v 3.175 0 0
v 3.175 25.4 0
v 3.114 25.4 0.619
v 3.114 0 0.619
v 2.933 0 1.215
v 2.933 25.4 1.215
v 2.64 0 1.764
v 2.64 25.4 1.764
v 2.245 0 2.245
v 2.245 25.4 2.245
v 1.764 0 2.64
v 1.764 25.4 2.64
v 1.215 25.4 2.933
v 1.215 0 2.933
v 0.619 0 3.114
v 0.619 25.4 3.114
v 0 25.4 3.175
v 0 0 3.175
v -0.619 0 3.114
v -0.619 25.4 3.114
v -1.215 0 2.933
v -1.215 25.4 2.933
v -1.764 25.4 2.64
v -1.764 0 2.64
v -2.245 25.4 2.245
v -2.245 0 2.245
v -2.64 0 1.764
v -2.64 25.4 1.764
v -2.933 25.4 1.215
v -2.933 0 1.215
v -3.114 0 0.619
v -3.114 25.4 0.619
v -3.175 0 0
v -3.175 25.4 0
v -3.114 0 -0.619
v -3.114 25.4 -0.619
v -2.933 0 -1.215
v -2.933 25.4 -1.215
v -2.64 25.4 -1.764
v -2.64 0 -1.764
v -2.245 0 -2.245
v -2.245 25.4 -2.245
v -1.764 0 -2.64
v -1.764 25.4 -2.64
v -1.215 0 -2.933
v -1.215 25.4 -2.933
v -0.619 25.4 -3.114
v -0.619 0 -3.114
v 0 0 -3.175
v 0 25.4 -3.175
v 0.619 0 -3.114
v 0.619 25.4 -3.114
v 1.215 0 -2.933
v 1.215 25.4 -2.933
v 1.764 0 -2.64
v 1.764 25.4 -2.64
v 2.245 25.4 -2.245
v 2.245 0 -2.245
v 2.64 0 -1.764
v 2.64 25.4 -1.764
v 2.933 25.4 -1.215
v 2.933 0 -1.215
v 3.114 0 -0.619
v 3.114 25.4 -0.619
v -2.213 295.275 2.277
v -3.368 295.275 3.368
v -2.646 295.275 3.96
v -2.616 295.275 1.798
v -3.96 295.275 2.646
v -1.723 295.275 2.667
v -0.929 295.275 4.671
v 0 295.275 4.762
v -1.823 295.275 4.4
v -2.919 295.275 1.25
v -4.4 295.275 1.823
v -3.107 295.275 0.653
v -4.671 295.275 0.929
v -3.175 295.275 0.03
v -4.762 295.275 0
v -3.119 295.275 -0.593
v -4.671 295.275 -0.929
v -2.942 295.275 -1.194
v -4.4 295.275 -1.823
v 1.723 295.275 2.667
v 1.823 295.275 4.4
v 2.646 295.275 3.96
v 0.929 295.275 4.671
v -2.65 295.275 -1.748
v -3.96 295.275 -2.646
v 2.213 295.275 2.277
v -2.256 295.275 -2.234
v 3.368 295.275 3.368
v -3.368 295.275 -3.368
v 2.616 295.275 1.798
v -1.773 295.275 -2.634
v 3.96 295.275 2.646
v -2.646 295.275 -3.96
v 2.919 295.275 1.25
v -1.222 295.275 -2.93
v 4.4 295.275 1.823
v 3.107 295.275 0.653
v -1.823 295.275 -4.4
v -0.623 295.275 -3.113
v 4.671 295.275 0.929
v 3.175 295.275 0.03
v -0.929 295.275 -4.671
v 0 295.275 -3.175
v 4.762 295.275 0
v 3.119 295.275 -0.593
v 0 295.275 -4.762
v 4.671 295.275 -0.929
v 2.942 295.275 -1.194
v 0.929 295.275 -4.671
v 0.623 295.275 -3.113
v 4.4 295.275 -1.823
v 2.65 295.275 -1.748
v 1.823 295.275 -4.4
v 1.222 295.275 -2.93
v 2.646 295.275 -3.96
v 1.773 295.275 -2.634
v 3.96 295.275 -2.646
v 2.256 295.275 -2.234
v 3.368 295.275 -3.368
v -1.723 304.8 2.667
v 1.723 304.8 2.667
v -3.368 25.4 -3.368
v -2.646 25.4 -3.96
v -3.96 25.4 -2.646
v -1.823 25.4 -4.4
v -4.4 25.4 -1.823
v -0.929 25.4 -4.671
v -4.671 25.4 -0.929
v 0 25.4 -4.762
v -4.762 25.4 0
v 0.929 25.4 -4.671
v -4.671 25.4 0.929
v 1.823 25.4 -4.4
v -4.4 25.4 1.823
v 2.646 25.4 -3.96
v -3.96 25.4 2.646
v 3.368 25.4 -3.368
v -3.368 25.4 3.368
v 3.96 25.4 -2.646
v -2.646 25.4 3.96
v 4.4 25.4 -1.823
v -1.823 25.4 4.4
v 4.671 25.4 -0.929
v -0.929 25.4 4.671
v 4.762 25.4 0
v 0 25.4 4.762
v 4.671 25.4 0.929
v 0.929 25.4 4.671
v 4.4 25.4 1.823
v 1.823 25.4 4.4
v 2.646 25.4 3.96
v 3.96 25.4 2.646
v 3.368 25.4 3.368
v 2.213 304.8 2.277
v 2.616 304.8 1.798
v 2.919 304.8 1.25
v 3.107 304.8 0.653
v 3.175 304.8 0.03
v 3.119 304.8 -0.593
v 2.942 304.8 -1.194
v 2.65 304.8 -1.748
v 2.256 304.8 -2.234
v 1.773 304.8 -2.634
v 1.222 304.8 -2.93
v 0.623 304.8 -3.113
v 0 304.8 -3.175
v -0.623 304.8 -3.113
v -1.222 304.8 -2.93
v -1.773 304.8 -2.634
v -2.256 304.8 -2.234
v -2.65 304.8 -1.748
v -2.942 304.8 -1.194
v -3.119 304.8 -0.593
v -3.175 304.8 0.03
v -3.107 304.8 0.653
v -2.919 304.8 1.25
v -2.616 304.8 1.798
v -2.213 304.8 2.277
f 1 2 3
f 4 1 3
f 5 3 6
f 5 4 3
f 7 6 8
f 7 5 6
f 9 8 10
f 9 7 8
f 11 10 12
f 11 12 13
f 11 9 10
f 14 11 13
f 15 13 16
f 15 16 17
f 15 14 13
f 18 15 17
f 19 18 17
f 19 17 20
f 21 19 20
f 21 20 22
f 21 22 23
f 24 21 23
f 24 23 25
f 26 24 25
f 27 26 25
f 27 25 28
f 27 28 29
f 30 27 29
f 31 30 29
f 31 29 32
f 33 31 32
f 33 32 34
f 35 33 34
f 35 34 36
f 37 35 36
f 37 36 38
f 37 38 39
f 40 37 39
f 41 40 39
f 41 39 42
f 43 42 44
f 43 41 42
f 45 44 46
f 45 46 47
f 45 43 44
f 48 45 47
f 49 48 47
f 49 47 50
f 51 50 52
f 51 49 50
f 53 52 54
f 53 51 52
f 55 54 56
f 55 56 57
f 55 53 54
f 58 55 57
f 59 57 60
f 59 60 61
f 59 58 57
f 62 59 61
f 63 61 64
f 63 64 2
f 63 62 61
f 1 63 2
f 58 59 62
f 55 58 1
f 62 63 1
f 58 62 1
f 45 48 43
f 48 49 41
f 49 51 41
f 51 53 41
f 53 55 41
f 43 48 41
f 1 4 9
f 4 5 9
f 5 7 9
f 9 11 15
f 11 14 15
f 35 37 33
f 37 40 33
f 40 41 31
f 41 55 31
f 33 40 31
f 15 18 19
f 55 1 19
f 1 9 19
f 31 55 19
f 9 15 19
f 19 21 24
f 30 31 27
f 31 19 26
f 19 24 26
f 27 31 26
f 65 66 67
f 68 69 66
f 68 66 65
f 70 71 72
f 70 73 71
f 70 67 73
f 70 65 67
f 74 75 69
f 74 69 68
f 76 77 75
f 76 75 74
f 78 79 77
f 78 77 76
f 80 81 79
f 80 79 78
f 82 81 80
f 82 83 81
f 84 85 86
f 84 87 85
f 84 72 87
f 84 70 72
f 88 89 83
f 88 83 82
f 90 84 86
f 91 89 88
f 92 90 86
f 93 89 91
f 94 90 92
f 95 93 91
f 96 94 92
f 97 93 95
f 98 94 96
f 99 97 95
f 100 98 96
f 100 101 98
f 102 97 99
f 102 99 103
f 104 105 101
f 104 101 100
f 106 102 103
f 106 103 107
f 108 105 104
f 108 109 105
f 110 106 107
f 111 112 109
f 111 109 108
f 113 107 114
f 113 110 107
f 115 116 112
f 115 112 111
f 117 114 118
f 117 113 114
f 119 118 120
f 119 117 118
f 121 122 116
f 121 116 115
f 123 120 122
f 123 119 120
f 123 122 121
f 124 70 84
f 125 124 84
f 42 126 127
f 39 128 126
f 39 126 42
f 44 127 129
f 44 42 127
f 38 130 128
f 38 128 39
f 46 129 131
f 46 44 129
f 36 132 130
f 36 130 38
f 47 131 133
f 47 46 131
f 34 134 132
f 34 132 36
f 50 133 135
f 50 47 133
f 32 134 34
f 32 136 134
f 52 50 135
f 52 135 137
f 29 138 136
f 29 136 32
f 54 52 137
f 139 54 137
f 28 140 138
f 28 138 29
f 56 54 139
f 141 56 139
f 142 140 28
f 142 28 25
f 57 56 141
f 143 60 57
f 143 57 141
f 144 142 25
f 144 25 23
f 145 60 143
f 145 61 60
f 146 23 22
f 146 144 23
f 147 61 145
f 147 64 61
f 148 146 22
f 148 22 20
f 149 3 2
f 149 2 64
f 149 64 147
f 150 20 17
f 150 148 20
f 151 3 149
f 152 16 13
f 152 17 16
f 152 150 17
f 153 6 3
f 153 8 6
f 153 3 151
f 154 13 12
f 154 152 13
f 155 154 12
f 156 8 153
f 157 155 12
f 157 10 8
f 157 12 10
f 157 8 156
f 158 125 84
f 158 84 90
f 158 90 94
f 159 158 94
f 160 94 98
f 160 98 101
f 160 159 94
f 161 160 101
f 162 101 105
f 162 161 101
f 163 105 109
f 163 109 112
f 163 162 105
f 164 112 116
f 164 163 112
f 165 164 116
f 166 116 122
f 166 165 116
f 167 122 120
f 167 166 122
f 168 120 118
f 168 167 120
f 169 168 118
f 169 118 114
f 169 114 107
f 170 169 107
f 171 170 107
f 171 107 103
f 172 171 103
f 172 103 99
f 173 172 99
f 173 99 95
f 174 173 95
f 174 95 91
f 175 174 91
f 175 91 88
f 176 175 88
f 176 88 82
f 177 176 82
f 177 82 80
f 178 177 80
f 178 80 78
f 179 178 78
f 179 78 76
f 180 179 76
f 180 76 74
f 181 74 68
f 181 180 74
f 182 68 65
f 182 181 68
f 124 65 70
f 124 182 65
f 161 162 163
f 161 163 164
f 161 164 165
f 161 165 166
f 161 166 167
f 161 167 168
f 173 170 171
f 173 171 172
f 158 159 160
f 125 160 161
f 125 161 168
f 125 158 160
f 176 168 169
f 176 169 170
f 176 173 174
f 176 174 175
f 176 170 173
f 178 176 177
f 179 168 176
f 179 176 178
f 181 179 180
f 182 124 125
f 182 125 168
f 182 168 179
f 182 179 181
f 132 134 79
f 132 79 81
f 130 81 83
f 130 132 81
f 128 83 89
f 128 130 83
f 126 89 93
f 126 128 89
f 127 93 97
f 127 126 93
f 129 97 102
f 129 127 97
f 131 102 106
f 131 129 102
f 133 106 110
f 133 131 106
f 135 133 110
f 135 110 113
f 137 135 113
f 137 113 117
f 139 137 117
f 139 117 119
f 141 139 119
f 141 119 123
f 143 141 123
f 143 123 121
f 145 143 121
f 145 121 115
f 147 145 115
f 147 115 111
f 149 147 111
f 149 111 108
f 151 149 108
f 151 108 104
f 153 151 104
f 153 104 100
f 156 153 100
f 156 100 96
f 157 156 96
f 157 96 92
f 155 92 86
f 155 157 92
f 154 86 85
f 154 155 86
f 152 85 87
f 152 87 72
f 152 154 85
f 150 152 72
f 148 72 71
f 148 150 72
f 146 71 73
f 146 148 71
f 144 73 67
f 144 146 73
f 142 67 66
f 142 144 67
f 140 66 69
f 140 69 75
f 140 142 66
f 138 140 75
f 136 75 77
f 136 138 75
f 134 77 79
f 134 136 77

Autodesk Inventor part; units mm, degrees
ref_plane "YZ Plane" through (0, 0, 0) normal (1, 0, 0) x (0, 1, 0)
ref_plane "XZ Plane" through (0, 0, 0) normal (0, 1, 0) x (-1, 0, 0)
ref_plane "XY Plane" through (0, 0, 0) normal (0, 0, 1) x (1, 0, 0)
sketch "Sketch1" plane through (0, 0, 0) normal (0, 1, 0) x (-1, 0, 0)
  circle A0 centre (0, 0) radius 4.7625
  dimension "d0" = 9.525
extrude "Extrusion1" add sketch "Sketch1" along normal blind 304.8
thread "Thread1" size "3/8-12" class "2B" standard "Inch Tapping Threads" full length
sketch "Sketch2" plane through (0, 304.8, 0) normal (0, 1, 0) x (1, 0, 0)
  circle A0 centre (0, 0) radius 4.7625 projected
  arc A1 (1.7227, -2.667) -> (-1.7227, -2.667) centre (0, 0) ccw
  line L0 (-1.7227, -2.667) -> (1.7227, -2.667)
  dimension "d5" = 6.35
  dimension "d6" = 2.667
extrude "Extrusion2" cut sketch "Sketch2" against normal blind 9.525
sketch "Sketch3" plane through (0, 0, 0) normal (0, -1, 0) x (1, 0, 0)
  circle A0 centre (0, 0) radius 4.7625 projected
  circle A1 centre (0, 0) radius 3.175
  dimension "d9" = 6.35
extrude "Extrusion3" cut sketch "Sketch3" against normal blind 25.4
properties part number "acmeScrew"
